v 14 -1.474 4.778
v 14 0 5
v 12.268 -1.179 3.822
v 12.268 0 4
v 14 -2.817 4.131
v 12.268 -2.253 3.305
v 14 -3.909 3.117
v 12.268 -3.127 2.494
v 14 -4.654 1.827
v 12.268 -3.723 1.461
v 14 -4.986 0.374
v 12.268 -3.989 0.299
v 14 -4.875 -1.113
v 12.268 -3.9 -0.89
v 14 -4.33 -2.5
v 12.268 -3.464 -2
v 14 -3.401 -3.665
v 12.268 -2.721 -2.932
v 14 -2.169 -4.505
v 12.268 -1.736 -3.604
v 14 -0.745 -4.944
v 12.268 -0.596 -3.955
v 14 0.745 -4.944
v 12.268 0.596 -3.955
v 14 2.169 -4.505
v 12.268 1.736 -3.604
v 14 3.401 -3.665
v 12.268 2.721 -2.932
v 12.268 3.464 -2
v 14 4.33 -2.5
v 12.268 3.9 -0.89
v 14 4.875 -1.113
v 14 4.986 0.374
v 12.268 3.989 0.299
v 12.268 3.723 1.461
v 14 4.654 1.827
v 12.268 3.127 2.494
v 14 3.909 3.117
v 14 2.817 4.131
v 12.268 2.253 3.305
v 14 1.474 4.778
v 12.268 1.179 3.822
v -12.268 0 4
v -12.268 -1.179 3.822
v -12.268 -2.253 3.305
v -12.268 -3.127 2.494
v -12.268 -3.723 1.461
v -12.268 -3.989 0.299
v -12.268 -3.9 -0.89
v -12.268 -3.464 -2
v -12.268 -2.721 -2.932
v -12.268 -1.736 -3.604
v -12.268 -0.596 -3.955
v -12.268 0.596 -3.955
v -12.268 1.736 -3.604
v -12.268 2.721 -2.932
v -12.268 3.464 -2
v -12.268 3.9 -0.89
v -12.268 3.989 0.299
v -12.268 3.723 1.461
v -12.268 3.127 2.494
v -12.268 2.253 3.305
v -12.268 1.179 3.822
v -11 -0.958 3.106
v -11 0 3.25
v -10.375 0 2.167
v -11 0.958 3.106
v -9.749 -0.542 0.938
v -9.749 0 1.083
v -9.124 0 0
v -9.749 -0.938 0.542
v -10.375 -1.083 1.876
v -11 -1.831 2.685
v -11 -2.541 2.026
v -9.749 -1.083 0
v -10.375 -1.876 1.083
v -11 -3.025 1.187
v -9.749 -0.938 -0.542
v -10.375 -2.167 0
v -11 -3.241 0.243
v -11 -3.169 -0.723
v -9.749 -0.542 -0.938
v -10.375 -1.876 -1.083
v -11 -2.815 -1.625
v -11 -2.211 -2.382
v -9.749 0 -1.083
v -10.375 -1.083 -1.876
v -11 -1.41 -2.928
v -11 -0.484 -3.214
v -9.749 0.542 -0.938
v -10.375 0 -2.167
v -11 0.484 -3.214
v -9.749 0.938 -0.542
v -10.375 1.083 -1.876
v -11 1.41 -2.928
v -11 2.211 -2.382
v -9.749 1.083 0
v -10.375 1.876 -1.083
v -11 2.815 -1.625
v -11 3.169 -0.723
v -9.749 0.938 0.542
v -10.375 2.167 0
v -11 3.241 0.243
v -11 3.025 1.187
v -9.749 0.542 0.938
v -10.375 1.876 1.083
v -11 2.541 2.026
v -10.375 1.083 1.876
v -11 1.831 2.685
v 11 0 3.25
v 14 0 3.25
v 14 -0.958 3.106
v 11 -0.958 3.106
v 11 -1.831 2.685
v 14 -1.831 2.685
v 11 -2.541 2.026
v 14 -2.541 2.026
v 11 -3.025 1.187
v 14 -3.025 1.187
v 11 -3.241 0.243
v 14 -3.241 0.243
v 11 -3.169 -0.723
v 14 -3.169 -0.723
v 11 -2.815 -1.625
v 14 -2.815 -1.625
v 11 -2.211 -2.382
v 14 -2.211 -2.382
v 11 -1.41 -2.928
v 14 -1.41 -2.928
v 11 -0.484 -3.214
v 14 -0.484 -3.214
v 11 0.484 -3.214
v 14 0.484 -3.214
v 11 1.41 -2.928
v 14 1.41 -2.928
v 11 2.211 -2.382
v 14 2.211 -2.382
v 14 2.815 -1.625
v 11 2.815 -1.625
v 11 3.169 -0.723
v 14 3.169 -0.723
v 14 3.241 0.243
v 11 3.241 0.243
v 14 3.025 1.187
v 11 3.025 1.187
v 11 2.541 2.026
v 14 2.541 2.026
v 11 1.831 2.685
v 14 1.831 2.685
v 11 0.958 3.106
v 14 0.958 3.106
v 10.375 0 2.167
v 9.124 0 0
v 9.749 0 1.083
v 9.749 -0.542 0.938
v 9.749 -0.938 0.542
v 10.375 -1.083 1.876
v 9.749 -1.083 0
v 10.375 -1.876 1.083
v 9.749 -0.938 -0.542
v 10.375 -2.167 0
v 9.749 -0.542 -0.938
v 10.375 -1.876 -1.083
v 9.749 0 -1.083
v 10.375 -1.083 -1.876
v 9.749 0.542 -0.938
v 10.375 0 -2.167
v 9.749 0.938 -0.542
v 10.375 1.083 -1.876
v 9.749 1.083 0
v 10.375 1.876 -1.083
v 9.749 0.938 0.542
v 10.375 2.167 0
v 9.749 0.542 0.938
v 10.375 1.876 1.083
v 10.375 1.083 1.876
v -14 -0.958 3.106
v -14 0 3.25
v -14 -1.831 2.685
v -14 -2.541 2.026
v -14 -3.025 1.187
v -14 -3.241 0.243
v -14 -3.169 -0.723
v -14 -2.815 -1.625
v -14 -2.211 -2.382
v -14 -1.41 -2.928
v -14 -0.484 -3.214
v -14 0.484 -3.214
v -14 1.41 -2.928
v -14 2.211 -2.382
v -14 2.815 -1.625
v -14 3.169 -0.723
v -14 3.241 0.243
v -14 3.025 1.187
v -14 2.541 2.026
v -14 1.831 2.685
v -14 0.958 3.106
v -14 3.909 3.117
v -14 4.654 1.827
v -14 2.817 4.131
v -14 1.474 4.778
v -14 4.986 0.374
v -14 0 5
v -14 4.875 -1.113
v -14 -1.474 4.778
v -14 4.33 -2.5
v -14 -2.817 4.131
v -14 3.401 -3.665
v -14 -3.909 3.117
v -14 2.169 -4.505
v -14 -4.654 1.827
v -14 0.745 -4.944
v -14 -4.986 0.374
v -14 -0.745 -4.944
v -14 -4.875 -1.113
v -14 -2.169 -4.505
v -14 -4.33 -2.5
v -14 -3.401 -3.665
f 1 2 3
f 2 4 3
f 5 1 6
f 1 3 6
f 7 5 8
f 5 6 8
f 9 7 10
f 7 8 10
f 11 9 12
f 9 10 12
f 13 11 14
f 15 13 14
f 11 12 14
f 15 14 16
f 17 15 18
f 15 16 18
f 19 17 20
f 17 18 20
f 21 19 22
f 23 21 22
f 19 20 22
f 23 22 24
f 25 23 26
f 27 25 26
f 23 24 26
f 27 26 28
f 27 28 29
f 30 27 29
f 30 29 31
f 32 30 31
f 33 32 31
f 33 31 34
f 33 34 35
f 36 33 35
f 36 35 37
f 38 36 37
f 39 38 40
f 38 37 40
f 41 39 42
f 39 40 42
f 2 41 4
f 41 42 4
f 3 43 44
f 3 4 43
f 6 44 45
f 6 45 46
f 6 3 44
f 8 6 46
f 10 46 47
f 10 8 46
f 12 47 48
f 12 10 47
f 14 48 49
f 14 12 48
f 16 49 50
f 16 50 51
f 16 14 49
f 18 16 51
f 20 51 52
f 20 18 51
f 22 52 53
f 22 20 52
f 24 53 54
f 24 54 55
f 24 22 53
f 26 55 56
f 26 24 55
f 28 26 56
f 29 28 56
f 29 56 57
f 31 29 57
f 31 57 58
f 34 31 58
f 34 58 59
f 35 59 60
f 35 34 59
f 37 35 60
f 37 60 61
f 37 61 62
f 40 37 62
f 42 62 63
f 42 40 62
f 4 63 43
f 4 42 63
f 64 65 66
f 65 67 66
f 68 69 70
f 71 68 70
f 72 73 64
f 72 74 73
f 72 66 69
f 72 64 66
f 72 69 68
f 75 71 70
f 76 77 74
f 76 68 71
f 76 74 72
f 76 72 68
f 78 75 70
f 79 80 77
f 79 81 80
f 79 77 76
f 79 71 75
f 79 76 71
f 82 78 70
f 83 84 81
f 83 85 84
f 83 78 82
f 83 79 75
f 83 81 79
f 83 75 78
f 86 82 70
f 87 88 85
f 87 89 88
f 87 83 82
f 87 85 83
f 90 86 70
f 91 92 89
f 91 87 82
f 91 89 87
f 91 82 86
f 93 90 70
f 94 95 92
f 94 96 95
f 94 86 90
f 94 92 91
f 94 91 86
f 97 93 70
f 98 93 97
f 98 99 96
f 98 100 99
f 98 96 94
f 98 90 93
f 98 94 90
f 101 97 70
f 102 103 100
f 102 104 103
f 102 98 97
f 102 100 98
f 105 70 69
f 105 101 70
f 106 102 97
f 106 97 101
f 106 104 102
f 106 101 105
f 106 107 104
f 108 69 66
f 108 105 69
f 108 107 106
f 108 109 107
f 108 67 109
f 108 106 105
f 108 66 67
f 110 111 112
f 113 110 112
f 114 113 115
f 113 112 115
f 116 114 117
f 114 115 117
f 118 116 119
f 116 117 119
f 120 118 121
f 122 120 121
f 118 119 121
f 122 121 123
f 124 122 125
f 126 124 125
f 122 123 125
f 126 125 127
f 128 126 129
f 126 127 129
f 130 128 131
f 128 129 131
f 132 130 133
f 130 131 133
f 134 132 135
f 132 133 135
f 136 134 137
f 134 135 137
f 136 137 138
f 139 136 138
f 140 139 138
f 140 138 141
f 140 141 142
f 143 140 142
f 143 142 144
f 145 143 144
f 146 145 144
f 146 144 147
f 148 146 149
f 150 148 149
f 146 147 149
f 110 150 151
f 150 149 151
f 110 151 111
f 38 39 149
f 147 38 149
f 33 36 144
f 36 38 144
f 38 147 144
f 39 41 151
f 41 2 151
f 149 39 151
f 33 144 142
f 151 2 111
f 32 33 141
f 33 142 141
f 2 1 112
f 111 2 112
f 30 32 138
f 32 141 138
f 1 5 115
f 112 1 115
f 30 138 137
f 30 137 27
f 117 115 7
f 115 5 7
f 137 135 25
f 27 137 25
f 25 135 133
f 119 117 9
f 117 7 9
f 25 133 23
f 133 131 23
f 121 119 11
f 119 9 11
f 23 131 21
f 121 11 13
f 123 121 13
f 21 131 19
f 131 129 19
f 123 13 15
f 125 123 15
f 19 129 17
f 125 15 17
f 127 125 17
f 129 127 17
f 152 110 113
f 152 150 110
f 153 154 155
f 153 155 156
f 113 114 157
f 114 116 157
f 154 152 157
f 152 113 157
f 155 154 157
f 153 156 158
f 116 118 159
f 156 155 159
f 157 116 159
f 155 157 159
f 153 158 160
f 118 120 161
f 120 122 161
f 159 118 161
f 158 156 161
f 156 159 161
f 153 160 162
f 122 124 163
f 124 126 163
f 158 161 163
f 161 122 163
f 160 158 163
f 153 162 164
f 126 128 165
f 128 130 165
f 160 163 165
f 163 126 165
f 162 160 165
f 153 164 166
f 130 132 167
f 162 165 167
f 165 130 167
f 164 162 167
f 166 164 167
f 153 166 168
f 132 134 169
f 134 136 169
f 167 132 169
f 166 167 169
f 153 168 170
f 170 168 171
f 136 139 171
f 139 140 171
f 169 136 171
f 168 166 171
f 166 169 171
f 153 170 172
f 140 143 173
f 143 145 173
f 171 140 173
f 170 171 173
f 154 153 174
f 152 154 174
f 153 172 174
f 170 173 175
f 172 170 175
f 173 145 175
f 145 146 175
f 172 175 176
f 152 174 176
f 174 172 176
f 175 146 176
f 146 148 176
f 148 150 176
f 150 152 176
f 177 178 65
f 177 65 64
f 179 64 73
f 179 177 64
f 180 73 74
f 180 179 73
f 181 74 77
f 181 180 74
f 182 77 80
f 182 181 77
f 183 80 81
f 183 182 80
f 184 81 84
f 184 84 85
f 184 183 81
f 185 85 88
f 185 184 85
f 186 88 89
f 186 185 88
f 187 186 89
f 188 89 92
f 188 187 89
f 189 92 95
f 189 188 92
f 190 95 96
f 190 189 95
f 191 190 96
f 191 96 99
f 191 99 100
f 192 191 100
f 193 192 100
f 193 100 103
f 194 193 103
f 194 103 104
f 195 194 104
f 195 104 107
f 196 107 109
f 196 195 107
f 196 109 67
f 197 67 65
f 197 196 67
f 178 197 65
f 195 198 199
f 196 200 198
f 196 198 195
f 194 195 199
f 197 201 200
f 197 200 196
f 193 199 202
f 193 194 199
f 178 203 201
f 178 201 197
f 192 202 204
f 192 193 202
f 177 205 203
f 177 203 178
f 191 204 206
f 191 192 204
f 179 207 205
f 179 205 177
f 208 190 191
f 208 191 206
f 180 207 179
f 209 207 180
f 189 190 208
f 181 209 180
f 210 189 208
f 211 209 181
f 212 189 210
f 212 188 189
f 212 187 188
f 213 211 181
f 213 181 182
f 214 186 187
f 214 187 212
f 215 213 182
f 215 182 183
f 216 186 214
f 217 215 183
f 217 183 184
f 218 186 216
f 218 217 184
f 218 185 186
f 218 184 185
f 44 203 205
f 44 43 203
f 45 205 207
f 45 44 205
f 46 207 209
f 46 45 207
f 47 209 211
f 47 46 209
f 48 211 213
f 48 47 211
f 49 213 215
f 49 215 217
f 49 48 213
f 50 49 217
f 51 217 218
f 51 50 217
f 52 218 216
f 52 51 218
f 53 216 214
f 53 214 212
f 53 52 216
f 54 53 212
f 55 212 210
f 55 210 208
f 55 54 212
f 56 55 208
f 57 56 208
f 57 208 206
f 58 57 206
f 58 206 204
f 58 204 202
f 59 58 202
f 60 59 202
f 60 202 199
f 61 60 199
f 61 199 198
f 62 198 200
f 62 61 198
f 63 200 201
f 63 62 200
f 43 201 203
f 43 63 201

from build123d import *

# Parameters (mm, degrees)
SKETCH1_W = 30
SKETCH1_H = 4
SKETCH2_W = 2
SKETCH2_H = 5


with BuildPart() as part:
    # Sketch1 → Base-Revolve (revolve)
    with BuildSketch(Plane.XY, mode=Mode.PRIVATE) as base_revolve_sk:
        with Locations((0, 2)):
            Rectangle(SKETCH1_W, SKETCH1_H)
    revolve(base_revolve_sk.sketch.rotate(Axis((-30, 0, 0), (1, 0, 0)), 90), axis=Axis((-30, 0, 0), (1, 0, 0)))

    # Sketch2 → Cut-to-GripLength (revolve, cut)
    with BuildSketch(Plane.XY):
        with Locations((-15, 2.5)):
            Rectangle(SKETCH2_W, SKETCH2_H)
        with Locations((15, 2.5)):
            Rectangle(SKETCH2_W, SKETCH2_H)
    revolve(axis=Axis((-30, 0, 0), (1, 0, 0)), mode=Mode.SUBTRACT)

    # Sketch4 → HeadTypeB (revolve)
    with BuildSketch(Plane.XY, mode=Mode.PRIVATE) as headtypeb_sk:
        Polygon((-14, 0), (-14, 5), (-12.267949192, 4), (-12.267949192, 0), align=None)
        Polygon((12.267949192, 0), (14, 0), (14, 5), (12.267949192, 4), align=None)
    revolve(headtypeb_sk.sketch.rotate(Axis((-20, 0, 0), (1, 0, 0)), 90), axis=Axis((-20, 0, 0), (1, 0, 0)))

    # Sketch5 → HoleTypeA (revolve, cut)
    with BuildSketch(Plane.XY, mode=Mode.PRIVATE) as holetypea_sk:
        Polygon((-9.123611625, 0), (-11, 3.25), (-15, 3.25), (-15, 0), align=None)
        Polygon((9.123611625, 0), (11, 3.25), (15, 3.25), (15, 0), align=None)
    revolve(holetypea_sk.sketch.rotate(Axis((-22, 0, 0), (1, 0, 0)), 90), axis=Axis((-22, 0, 0), (1, 0, 0)), mode=Mode.SUBTRACT)


solid = part.part
